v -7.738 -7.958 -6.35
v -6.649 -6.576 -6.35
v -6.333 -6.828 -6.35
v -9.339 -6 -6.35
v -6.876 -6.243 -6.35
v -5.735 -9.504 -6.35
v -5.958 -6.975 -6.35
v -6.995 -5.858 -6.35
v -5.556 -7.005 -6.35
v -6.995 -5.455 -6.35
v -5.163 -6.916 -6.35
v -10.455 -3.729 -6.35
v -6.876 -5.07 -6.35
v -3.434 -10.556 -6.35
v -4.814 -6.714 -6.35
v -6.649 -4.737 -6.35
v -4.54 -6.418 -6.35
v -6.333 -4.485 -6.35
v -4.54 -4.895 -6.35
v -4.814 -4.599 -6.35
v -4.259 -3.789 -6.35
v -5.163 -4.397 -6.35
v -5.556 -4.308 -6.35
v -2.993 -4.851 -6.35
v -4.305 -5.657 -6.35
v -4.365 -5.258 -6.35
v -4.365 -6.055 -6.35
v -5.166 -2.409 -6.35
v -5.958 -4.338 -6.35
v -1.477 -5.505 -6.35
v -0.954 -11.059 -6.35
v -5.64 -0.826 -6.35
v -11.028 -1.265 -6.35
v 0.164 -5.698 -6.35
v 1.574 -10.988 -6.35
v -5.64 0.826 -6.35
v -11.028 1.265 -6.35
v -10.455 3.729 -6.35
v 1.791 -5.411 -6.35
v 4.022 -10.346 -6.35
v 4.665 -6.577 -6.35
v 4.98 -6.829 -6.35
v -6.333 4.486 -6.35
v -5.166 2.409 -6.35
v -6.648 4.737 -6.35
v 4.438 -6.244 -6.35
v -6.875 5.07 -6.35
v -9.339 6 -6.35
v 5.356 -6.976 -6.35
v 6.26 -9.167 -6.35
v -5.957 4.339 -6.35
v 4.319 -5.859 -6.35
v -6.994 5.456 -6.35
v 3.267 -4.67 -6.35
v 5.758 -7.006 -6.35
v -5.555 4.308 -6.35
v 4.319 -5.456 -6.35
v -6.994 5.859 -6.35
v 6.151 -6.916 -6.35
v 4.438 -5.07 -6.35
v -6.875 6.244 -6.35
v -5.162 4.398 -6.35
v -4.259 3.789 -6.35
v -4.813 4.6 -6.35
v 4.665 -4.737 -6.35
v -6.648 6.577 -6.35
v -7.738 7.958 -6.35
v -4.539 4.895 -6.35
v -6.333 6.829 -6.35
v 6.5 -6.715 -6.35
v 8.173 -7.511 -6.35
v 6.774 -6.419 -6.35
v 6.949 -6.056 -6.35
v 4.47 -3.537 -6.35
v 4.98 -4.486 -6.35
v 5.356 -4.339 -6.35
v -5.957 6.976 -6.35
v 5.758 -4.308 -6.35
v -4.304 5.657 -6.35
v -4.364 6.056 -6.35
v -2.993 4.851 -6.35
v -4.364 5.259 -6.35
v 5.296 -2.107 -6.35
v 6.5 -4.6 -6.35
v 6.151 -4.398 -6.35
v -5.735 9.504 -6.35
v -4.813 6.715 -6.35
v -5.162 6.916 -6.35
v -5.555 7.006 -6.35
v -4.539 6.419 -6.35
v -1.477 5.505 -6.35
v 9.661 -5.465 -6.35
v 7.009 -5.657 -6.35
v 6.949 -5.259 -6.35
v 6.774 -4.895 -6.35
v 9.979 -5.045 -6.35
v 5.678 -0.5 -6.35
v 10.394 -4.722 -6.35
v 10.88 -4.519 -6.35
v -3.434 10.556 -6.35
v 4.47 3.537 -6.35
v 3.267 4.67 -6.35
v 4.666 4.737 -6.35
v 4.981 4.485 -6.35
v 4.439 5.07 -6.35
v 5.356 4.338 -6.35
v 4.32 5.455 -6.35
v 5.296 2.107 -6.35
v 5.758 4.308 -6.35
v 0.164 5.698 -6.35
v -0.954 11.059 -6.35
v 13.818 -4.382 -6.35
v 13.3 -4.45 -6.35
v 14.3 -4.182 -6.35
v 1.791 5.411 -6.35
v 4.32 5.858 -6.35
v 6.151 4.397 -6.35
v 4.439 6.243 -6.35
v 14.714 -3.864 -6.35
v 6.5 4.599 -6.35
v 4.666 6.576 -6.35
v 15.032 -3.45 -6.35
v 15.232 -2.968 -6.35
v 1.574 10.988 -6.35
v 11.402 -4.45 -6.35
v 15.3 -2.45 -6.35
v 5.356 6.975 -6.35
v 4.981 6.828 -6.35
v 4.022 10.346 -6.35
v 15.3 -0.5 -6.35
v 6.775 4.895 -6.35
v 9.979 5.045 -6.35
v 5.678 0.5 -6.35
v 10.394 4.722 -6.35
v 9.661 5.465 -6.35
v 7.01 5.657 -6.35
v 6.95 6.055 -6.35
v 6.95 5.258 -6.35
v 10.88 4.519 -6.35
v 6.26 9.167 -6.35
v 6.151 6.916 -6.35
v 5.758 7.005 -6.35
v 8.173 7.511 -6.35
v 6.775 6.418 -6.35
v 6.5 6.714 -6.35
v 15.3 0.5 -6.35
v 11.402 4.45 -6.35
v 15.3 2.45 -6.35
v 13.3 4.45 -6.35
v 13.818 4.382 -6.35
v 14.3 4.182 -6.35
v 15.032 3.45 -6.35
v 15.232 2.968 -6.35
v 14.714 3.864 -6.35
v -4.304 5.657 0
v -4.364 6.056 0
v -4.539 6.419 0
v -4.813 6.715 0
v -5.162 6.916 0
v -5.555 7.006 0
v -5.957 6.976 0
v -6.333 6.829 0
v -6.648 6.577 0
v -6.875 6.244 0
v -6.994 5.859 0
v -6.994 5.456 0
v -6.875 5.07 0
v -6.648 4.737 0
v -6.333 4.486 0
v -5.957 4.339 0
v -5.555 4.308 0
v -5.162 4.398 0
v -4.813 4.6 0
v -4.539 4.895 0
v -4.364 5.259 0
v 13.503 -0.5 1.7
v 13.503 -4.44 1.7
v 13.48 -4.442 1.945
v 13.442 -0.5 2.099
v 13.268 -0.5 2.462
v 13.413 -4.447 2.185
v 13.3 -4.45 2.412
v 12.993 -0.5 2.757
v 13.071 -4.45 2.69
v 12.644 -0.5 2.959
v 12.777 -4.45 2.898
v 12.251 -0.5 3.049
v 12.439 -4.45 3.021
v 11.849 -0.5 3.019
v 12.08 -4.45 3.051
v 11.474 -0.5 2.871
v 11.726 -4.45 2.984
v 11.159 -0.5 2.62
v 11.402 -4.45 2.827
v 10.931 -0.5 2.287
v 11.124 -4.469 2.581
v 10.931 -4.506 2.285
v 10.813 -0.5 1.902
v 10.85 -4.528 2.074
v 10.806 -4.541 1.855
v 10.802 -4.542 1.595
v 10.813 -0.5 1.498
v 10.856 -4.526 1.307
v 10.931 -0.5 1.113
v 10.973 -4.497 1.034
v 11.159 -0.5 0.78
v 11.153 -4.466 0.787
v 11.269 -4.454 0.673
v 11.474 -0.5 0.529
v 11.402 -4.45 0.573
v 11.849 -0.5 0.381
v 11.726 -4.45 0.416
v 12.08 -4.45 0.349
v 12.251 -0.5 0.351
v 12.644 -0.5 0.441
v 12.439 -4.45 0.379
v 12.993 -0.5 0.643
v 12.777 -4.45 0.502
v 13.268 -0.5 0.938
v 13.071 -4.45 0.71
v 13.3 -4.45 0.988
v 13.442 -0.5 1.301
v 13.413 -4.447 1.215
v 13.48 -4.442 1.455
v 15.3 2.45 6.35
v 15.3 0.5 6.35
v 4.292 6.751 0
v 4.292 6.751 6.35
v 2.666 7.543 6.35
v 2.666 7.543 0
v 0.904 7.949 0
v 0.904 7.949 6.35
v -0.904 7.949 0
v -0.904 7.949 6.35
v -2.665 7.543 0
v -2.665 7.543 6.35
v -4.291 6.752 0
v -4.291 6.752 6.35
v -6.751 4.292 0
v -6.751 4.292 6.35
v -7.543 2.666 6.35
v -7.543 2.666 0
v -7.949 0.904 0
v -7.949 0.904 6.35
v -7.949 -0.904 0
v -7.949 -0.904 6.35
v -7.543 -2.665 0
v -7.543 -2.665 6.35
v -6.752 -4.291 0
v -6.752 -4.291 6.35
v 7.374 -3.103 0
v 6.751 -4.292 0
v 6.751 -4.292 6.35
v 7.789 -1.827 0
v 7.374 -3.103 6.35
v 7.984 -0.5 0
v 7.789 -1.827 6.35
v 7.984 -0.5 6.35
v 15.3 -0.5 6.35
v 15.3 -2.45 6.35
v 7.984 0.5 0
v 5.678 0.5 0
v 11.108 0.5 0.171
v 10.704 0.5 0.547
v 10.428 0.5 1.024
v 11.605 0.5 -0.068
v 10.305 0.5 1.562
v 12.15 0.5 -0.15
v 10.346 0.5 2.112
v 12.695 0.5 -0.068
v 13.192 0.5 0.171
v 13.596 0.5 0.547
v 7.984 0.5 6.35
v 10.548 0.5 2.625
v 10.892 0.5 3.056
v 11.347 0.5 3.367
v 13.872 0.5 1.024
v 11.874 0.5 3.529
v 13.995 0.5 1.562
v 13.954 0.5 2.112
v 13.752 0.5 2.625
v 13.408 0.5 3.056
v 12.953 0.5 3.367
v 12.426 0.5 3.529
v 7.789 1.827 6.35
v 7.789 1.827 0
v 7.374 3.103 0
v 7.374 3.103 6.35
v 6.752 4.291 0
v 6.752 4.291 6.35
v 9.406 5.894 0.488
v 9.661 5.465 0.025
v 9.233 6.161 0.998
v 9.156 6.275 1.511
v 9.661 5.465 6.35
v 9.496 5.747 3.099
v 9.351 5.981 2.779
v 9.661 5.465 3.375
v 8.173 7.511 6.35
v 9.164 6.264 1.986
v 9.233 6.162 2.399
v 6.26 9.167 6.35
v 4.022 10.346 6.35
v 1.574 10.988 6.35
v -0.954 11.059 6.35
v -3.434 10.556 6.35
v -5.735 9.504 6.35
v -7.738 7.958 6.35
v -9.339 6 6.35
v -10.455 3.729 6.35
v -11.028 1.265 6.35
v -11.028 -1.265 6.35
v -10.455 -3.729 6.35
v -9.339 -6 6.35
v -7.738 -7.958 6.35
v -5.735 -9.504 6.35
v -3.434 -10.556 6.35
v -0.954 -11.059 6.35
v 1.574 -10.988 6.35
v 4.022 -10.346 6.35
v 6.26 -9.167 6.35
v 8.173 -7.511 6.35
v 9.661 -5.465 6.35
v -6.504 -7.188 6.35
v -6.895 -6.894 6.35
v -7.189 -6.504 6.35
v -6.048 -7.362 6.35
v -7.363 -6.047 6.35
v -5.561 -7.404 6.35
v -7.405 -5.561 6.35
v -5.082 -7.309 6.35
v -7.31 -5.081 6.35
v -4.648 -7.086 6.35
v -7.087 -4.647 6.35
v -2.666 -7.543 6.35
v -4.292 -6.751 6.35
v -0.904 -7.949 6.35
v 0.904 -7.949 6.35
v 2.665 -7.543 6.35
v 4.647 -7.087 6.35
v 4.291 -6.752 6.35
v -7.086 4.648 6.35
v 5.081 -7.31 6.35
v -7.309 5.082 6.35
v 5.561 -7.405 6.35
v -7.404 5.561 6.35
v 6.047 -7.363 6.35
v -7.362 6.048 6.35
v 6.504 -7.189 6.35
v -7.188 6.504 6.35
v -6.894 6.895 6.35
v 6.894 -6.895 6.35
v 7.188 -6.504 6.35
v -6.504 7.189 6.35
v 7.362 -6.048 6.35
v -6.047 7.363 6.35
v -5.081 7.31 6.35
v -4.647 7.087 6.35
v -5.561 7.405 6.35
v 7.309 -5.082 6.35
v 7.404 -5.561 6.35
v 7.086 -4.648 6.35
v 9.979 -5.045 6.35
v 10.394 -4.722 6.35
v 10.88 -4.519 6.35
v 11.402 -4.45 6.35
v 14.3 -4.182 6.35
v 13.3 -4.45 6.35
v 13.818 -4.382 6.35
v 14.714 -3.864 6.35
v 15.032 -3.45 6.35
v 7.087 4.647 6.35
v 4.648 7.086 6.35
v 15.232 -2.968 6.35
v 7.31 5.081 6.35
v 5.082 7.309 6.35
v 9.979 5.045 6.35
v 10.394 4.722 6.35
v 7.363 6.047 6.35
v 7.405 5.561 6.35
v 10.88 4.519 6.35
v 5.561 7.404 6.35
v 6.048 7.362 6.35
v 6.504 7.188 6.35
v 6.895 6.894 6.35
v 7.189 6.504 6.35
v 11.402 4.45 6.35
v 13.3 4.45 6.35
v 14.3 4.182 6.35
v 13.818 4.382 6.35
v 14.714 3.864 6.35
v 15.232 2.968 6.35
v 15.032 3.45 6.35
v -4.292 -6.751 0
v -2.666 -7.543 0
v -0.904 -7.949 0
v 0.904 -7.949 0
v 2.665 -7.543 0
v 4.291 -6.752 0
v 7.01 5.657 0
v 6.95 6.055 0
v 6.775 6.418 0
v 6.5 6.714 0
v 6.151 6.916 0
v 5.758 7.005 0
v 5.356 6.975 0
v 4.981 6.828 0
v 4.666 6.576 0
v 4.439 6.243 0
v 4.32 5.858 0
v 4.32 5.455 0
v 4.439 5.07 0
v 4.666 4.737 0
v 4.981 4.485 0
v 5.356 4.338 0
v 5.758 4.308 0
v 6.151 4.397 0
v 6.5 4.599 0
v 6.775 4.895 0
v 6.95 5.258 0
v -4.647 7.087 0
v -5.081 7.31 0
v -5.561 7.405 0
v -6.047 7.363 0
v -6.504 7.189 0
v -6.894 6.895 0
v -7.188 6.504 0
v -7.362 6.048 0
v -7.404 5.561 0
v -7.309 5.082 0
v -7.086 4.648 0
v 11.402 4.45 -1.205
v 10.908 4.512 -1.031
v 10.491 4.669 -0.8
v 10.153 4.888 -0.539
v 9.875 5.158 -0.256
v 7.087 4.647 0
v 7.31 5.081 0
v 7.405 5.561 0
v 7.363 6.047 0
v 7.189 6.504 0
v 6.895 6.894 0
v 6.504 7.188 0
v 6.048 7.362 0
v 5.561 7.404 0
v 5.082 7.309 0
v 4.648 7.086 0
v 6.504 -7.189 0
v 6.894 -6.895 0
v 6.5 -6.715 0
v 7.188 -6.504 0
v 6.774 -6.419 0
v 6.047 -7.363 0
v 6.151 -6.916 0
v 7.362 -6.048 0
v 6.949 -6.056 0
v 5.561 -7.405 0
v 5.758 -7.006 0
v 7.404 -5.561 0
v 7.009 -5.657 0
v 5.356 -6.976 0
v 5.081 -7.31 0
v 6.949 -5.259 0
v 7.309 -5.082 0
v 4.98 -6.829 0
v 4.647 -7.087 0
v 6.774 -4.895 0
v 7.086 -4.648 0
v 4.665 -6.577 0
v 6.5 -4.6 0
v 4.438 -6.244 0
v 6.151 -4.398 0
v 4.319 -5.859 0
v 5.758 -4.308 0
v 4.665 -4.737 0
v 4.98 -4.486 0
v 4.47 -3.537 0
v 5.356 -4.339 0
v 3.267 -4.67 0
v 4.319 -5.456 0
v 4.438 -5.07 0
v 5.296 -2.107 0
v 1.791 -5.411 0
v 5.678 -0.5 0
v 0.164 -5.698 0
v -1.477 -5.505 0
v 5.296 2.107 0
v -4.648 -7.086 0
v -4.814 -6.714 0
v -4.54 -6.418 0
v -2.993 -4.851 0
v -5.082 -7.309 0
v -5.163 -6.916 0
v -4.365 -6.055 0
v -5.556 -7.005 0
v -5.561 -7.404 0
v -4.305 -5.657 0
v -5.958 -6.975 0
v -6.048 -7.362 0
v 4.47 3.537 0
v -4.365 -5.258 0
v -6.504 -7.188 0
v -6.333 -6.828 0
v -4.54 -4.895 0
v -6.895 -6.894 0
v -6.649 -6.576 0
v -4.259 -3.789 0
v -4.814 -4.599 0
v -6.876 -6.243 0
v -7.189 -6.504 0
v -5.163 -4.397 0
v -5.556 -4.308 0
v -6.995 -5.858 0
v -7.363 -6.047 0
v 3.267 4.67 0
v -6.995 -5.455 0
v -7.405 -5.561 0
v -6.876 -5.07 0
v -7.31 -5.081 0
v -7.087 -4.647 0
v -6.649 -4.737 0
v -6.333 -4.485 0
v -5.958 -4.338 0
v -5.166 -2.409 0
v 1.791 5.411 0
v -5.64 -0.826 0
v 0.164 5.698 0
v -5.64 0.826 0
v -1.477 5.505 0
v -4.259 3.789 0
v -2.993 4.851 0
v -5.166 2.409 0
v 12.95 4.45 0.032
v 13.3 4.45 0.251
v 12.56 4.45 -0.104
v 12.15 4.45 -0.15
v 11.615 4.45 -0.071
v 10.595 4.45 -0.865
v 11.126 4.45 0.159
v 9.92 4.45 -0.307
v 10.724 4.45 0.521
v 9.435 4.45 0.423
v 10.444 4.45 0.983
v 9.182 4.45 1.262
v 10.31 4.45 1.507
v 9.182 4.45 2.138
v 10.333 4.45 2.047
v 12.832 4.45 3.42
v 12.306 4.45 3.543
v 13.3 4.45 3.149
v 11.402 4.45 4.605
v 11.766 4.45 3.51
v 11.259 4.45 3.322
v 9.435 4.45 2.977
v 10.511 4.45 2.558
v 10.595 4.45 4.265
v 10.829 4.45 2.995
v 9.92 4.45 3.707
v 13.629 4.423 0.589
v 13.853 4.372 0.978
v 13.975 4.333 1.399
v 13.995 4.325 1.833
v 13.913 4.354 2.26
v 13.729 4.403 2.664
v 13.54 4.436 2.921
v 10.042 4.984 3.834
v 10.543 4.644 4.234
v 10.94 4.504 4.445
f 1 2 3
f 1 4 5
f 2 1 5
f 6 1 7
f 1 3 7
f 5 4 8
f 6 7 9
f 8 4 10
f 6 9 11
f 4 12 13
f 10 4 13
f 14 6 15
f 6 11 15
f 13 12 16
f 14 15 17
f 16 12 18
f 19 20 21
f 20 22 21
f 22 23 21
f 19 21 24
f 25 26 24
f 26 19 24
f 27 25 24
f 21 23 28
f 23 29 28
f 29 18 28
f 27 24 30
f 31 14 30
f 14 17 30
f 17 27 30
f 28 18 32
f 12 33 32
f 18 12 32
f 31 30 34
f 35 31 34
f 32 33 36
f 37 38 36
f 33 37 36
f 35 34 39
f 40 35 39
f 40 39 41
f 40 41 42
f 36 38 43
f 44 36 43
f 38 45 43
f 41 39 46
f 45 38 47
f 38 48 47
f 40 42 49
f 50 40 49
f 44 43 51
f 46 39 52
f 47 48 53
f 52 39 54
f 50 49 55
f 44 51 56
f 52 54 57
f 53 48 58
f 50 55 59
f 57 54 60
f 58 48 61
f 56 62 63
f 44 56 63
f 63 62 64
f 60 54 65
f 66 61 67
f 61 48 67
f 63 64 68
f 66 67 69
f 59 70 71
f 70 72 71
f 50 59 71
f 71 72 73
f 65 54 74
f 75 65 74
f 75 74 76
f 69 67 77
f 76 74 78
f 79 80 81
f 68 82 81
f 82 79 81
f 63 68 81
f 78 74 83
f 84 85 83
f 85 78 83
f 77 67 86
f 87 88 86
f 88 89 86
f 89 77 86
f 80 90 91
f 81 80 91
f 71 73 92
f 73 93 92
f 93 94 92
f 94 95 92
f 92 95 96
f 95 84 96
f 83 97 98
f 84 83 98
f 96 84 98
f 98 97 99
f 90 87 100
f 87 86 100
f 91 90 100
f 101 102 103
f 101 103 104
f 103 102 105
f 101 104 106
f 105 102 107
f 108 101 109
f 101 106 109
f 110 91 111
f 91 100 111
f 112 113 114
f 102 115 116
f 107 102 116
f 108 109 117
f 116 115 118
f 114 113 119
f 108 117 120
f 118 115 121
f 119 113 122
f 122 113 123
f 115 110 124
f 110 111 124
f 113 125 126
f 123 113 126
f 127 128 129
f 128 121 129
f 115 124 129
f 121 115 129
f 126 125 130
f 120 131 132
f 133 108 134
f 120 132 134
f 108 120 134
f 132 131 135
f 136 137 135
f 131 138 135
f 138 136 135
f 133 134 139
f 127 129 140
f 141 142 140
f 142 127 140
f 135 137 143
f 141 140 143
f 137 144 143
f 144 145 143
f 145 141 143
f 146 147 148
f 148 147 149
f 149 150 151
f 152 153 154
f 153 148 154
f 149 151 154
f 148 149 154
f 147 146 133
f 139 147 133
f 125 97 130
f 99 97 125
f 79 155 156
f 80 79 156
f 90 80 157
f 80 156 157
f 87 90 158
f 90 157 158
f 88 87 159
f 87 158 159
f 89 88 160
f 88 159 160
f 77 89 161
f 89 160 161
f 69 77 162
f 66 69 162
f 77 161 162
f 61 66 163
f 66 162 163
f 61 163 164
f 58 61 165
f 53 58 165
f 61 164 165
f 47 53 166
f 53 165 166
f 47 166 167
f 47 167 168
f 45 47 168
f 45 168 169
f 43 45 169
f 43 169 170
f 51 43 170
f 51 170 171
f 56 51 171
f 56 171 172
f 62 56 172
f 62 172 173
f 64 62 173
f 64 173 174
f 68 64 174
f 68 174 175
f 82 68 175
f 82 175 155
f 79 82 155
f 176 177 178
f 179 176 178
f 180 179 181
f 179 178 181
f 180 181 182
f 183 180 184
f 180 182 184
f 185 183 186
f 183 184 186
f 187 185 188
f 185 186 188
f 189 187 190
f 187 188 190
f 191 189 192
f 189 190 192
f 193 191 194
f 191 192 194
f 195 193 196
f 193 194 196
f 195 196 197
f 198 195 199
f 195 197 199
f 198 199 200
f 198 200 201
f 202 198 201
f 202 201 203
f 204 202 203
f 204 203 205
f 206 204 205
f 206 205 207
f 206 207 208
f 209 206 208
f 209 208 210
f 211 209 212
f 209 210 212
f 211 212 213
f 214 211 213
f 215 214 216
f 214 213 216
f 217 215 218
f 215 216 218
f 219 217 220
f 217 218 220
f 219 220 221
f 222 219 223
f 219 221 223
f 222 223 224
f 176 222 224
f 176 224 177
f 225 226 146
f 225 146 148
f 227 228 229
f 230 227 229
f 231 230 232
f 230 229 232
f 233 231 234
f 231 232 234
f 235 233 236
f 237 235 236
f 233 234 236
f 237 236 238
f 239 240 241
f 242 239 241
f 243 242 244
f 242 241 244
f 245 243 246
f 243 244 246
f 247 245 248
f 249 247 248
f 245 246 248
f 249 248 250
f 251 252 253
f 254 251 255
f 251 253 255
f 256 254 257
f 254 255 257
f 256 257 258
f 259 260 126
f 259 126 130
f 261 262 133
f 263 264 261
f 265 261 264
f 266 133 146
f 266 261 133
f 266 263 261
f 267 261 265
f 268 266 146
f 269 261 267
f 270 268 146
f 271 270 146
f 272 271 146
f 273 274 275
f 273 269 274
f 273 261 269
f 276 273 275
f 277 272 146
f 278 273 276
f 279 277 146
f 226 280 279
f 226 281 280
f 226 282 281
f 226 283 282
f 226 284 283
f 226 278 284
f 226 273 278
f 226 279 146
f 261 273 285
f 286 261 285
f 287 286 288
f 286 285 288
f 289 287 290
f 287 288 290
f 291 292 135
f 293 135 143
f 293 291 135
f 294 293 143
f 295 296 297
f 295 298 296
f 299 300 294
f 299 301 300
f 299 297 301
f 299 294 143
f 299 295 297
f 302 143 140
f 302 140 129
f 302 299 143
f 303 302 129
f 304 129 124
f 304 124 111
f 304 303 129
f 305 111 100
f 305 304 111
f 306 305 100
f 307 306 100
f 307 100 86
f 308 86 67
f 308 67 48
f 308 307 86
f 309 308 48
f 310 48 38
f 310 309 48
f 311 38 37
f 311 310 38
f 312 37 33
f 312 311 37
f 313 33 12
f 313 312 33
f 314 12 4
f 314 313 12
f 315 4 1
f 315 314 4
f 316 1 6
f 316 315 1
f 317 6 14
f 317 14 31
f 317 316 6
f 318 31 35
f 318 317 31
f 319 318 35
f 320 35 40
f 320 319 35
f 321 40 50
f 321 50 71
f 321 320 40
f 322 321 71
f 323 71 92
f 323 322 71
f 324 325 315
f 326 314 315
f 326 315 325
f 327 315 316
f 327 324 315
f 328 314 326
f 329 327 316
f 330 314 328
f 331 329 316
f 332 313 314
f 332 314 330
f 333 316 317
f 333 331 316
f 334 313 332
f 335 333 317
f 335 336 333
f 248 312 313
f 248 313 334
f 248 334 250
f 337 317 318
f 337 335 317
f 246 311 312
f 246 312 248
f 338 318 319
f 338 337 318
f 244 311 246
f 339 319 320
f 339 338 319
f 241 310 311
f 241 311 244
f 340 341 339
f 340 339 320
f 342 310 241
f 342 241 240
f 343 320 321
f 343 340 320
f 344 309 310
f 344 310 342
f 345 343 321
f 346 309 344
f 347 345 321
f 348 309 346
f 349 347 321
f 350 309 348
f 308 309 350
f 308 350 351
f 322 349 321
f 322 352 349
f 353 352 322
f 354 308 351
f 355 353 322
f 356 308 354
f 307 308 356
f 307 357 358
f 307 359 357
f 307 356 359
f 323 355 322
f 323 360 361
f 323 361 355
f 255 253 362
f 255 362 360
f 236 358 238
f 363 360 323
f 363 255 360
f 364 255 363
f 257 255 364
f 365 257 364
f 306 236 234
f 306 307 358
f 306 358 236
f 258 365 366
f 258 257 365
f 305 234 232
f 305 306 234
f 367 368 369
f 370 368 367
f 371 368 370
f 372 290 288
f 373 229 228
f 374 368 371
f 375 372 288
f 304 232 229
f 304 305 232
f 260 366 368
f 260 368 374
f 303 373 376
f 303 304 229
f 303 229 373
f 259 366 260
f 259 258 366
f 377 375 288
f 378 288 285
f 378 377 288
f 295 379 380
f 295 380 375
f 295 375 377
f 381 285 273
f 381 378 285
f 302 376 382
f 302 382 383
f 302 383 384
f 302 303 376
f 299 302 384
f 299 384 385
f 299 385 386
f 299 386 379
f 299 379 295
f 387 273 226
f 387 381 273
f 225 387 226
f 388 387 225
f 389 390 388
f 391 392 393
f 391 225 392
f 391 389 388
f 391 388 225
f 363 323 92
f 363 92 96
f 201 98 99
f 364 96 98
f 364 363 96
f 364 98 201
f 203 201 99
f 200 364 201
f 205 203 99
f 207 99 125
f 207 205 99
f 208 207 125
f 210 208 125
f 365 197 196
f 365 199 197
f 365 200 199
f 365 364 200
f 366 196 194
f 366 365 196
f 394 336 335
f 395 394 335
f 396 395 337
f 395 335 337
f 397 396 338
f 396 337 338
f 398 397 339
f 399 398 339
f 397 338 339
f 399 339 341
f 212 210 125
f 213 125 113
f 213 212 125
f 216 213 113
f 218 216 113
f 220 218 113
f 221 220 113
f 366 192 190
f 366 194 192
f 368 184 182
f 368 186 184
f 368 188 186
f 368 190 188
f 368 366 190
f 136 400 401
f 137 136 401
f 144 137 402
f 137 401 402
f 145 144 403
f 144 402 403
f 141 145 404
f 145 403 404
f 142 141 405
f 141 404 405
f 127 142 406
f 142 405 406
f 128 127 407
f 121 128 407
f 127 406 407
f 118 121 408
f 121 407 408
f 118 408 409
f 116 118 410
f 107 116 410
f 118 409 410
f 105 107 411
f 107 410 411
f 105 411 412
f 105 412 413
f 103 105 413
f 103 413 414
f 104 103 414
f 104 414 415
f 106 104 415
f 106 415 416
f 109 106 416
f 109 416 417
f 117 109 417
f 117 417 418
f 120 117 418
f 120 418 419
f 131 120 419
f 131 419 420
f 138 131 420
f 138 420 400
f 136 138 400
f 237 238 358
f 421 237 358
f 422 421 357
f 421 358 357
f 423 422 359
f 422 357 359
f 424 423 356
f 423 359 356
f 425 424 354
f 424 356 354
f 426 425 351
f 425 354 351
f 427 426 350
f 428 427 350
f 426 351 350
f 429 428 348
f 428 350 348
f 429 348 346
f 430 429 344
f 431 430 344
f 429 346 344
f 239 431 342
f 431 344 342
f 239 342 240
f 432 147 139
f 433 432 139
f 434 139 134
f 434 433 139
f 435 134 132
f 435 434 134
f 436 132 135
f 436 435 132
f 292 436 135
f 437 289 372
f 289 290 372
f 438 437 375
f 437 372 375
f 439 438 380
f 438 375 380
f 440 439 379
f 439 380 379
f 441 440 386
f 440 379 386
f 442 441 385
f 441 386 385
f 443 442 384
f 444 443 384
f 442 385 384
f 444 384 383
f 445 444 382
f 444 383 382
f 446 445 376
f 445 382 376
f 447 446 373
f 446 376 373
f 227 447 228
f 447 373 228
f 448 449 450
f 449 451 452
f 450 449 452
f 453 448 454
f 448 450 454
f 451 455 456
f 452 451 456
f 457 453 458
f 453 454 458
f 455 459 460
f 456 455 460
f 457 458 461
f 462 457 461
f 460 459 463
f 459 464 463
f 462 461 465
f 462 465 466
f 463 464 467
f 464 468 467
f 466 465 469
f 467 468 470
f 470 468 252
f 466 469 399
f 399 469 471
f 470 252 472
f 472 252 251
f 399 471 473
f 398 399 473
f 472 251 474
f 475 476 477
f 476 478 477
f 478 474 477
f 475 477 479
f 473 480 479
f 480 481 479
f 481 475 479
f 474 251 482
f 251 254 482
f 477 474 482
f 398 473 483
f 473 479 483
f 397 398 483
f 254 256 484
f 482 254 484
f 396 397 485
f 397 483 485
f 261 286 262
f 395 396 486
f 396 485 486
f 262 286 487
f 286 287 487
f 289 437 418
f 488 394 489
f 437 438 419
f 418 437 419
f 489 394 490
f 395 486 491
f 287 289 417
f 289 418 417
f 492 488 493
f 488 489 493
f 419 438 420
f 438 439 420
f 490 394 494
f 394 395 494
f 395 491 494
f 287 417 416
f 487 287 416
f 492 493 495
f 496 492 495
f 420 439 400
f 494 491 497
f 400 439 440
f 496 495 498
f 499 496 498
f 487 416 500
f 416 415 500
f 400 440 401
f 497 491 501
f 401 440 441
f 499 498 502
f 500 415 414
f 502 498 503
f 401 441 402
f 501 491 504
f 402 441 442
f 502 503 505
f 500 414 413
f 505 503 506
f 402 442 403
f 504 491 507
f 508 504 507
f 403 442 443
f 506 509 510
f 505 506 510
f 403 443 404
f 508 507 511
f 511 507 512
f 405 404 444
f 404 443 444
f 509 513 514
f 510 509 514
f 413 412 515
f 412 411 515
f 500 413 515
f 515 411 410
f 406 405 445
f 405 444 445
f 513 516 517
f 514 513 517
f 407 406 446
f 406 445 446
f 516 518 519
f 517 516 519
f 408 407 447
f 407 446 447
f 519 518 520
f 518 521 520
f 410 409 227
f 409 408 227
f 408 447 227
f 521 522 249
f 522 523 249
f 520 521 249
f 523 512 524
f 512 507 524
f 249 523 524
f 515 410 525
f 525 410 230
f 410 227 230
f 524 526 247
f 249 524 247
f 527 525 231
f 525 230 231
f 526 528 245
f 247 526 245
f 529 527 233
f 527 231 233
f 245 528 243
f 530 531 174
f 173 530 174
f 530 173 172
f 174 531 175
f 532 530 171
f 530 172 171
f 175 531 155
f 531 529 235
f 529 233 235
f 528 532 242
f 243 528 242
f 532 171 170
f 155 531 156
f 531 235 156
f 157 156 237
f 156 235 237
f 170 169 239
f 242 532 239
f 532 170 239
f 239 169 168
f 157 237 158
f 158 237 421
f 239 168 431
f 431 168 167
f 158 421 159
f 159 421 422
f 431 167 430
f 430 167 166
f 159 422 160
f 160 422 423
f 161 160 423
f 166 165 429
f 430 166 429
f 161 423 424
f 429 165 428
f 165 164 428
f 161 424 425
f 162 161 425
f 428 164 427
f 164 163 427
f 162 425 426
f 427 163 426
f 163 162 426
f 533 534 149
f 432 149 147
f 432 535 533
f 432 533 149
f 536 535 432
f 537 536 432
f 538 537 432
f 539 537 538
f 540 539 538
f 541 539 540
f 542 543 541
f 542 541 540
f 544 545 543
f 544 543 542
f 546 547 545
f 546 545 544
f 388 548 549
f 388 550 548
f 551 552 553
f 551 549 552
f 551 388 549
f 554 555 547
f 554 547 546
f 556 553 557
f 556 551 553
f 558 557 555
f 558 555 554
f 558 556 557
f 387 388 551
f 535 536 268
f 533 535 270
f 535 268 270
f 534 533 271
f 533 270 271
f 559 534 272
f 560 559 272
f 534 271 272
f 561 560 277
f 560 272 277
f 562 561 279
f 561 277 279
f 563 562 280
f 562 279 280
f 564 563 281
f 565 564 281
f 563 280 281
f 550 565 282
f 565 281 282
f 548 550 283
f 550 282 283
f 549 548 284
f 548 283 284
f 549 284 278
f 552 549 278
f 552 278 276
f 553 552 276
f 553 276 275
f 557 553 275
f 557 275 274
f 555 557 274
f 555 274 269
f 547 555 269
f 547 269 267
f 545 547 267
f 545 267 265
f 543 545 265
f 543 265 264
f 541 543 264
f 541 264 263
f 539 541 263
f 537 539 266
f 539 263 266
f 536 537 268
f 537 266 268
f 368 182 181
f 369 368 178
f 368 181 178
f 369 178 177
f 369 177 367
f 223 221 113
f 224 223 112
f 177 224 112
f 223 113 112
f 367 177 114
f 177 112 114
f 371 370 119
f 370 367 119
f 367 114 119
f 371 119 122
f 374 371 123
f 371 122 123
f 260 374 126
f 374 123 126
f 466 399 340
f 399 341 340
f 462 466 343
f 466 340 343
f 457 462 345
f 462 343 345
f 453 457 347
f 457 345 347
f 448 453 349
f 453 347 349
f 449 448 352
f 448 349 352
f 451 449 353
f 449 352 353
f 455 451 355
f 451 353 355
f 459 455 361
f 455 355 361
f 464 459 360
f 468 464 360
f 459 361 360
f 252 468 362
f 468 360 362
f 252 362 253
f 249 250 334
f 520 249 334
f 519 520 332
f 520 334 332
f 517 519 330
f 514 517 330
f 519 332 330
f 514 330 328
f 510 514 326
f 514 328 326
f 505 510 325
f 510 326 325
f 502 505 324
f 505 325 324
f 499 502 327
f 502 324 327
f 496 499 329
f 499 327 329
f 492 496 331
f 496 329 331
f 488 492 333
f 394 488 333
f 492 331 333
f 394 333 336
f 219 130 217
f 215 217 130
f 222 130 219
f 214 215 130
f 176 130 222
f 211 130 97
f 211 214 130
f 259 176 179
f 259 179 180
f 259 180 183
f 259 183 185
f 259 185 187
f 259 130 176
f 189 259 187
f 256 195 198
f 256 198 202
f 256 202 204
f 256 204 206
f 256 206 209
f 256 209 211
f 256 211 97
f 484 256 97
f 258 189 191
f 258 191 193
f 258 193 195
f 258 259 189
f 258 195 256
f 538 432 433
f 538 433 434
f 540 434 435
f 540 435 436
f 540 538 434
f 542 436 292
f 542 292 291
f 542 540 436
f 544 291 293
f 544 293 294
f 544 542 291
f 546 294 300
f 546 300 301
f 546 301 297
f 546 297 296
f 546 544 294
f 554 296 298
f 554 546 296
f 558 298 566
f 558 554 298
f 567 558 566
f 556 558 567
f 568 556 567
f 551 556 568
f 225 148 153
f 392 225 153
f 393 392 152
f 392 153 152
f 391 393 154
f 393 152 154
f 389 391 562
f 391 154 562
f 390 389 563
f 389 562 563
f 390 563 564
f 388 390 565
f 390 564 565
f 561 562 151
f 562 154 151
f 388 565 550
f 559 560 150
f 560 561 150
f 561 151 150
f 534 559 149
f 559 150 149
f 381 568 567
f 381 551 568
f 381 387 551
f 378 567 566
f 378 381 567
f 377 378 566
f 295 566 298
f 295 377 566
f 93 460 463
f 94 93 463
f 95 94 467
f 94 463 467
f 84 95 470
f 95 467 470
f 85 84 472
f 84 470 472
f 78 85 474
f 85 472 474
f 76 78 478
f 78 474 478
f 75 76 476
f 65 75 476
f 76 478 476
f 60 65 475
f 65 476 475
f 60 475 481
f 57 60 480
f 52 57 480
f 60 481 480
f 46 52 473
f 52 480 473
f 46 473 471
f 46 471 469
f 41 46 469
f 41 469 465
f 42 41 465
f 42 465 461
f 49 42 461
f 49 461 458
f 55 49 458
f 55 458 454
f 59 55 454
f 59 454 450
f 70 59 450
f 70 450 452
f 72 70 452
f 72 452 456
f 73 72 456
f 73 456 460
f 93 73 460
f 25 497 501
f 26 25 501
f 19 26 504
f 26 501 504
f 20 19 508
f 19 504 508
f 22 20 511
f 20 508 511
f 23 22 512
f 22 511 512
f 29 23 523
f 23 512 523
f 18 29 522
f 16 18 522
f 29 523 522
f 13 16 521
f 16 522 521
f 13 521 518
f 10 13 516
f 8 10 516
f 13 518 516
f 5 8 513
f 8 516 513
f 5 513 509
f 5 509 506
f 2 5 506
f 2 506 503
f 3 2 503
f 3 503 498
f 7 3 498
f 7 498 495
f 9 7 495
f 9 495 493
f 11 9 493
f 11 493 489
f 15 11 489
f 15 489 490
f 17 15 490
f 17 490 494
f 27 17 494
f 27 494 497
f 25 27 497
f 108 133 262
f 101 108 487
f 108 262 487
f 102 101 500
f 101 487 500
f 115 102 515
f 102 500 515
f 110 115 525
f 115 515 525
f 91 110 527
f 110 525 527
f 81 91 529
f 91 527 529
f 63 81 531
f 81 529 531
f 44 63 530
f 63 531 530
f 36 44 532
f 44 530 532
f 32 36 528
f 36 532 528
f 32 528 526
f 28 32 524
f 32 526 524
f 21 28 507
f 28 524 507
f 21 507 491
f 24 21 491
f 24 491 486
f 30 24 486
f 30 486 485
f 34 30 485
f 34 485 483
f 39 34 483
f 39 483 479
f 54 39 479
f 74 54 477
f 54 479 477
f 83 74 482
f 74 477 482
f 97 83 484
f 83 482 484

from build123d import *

# Parameters (mm, degrees)
BOSS_EXTRUDE1_DEPTH       = 6.35
F_6_32_TAPPED_HOLE3_D     = 2.7051
SKETCH14_R                = 1.85
CUT_EXTRUDE6_DEPTH        = 21.223068511
F_6_32_TAPPED_HOLE5_D     = 2.7051
F_6_32_TAPPED_HOLE5_DEPTH = 50.8
F_6_32_TAPPED_HOLE5_TIP   = 0.81269403
SKETCH24_R                = 3
CUT_EXTRUDE26_DEPTH       = 36.126165479
FILLET1_R                 = 2
SKETCH28_R                = 1.75
CUT_EXTRUDE27_DEPTH       = 6.35


with BuildPart() as part:
    # Sketch1 → Boss-Extrude1 (new, symmetric)
    with BuildSketch(Plane.XY):
        with BuildLine():
            Line((0, 0), (0, 0.5))
            Line((0, 0.5), (15.3, 0.5))
            Line((15.3, 0.5), (15.3, 4.45))
            Line((15.3, 4.45), (11.402083143, 4.45))
            ThreePointArc((11.402083143, 4.45), (10.394478471, 4.722362068), (9.661307091, 5.465267176))
            ThreePointArc((9.661307091, 5.465267176), (-11.1, 0), (9.661307091, -5.465267176))
            ThreePointArc((9.661307091, -5.465267176), (10.394478471, -4.722362068), (11.402083143, -4.45))
            Line((11.402083143, -4.45), (15.3, -4.45))
            Line((15.3, -4.45), (15.3, -0.5))
            Line((15.3, -0.5), (0, -0.5))
            Line((0, -0.5), (0, 0))
        make_face()
    extrude(amount=BOSS_EXTRUDE1_DEPTH, both=True)

    # Sketch27 → Cut-Revolve1 (revolve, cut)
    with BuildSketch(Plane(origin=(0, 0, 0), x_dir=(1, 0, 0), z_dir=(0, 1, 0))):
        Polygon((0, 6.35), (5.7, 6.35), (5.7, 0), (8, 0), (8, -6.35), (0, -6.35), align=None)
    revolve(axis=Axis((0, 0, -6.35), (0, 0, 1)), mode=Mode.SUBTRACT)

    # #6-32 Tapped Hole3 (through all)
    with Locations(Plane(origin=(-5.656516225, 5.657192254, -6.35), x_dir=(-1, 0, 0), z_dir=(0, 0, -1))):
        with Locations((0, 0), (-11.313708479, -0.000676029), (-11.31303245, -11.314384508), (0.000676029, -11.313708479)):
            Hole(F_6_32_TAPPED_HOLE3_D / 2)

    # Sketch14 → Cut-Extrude6 (cut, through all)
    with BuildSketch(Plane.XZ.offset(-0.5)):
        with Locations(Location((12.15, 1.7, 0), (0, 0, 270))):
            Circle(SKETCH14_R)
    extrude(amount=-CUT_EXTRUDE6_DEPTH, mode=Mode.SUBTRACT)

    # #6-32 Tapped Hole5
    with Locations(Plane(origin=(0, -0.5, 0), x_dir=(-1, 0, 0), z_dir=(0, 1, 0))):
        with Locations((-12.15, 1.7)):
            Hole(F_6_32_TAPPED_HOLE5_D / 2, depth=F_6_32_TAPPED_HOLE5_DEPTH)
            with Locations((0, 0, -(F_6_32_TAPPED_HOLE5_DEPTH + F_6_32_TAPPED_HOLE5_TIP / 2))):  # 118° drill point
                Cone(0, F_6_32_TAPPED_HOLE5_D / 2, F_6_32_TAPPED_HOLE5_TIP, mode=Mode.SUBTRACT)

    # Sketch24 → Cut-Extrude26 (cut, through all)
    with BuildSketch(Plane(origin=(19.75, 4.45, 0), x_dir=(0, 0, -1), z_dir=(0, 1, 0))):
        with Locations((-1.7, 7.6)):
            Circle(SKETCH24_R)
    extrude(amount=CUT_EXTRUDE26_DEPTH, mode=Mode.SUBTRACT)

    # Fillet1
    # the kernel refuses this fillet: 2 mm, written as the material it takes off along each edge
    with BuildSketch(Plane(origin=(15.3, -4.45, -11.35), x_dir=(0, 1, 0), z_dir=(0, 0, 1))) as fillet1_piece_1:
        with BuildLine():
            CenterArc((FILLET1_R, FILLET1_R), FILLET1_R, 180, 90)
            Line((0, FILLET1_R), (0, 0))
            Line((0, 0), (FILLET1_R, 0))
        make_face()
    extrude(amount=22.7, mode=Mode.SUBTRACT)
    with BuildSketch(Plane(origin=(15.3, 4.45, -11.35), x_dir=(0, -1, 0), z_dir=(0, 0, 1))) as fillet1_piece_2:
        with BuildLine():
            CenterArc((FILLET1_R, -FILLET1_R), FILLET1_R, 90, 90)
            Line((0, -FILLET1_R), (0, 0))
            Line((0, 0), (FILLET1_R, 0))
        make_face()
    extrude(amount=22.7, mode=Mode.SUBTRACT)

    # Sketch28 → Cut-Extrude27 (cut)
    with BuildSketch(Plane.XY.offset(6.35)):
        with Locations((5.656516225, -5.657192254)):
            Circle(SKETCH28_R)
        with Locations((-5.656516225, 5.657192254)):
            Circle(SKETCH28_R)
        with Locations((5.657192254, 5.656516225)):
            Circle(SKETCH28_R)
        with Locations((-5.657192254, -5.656516225)):
            Circle(SKETCH28_R)
    extrude(amount=-CUT_EXTRUDE27_DEPTH, mode=Mode.SUBTRACT)


solid = part.part
